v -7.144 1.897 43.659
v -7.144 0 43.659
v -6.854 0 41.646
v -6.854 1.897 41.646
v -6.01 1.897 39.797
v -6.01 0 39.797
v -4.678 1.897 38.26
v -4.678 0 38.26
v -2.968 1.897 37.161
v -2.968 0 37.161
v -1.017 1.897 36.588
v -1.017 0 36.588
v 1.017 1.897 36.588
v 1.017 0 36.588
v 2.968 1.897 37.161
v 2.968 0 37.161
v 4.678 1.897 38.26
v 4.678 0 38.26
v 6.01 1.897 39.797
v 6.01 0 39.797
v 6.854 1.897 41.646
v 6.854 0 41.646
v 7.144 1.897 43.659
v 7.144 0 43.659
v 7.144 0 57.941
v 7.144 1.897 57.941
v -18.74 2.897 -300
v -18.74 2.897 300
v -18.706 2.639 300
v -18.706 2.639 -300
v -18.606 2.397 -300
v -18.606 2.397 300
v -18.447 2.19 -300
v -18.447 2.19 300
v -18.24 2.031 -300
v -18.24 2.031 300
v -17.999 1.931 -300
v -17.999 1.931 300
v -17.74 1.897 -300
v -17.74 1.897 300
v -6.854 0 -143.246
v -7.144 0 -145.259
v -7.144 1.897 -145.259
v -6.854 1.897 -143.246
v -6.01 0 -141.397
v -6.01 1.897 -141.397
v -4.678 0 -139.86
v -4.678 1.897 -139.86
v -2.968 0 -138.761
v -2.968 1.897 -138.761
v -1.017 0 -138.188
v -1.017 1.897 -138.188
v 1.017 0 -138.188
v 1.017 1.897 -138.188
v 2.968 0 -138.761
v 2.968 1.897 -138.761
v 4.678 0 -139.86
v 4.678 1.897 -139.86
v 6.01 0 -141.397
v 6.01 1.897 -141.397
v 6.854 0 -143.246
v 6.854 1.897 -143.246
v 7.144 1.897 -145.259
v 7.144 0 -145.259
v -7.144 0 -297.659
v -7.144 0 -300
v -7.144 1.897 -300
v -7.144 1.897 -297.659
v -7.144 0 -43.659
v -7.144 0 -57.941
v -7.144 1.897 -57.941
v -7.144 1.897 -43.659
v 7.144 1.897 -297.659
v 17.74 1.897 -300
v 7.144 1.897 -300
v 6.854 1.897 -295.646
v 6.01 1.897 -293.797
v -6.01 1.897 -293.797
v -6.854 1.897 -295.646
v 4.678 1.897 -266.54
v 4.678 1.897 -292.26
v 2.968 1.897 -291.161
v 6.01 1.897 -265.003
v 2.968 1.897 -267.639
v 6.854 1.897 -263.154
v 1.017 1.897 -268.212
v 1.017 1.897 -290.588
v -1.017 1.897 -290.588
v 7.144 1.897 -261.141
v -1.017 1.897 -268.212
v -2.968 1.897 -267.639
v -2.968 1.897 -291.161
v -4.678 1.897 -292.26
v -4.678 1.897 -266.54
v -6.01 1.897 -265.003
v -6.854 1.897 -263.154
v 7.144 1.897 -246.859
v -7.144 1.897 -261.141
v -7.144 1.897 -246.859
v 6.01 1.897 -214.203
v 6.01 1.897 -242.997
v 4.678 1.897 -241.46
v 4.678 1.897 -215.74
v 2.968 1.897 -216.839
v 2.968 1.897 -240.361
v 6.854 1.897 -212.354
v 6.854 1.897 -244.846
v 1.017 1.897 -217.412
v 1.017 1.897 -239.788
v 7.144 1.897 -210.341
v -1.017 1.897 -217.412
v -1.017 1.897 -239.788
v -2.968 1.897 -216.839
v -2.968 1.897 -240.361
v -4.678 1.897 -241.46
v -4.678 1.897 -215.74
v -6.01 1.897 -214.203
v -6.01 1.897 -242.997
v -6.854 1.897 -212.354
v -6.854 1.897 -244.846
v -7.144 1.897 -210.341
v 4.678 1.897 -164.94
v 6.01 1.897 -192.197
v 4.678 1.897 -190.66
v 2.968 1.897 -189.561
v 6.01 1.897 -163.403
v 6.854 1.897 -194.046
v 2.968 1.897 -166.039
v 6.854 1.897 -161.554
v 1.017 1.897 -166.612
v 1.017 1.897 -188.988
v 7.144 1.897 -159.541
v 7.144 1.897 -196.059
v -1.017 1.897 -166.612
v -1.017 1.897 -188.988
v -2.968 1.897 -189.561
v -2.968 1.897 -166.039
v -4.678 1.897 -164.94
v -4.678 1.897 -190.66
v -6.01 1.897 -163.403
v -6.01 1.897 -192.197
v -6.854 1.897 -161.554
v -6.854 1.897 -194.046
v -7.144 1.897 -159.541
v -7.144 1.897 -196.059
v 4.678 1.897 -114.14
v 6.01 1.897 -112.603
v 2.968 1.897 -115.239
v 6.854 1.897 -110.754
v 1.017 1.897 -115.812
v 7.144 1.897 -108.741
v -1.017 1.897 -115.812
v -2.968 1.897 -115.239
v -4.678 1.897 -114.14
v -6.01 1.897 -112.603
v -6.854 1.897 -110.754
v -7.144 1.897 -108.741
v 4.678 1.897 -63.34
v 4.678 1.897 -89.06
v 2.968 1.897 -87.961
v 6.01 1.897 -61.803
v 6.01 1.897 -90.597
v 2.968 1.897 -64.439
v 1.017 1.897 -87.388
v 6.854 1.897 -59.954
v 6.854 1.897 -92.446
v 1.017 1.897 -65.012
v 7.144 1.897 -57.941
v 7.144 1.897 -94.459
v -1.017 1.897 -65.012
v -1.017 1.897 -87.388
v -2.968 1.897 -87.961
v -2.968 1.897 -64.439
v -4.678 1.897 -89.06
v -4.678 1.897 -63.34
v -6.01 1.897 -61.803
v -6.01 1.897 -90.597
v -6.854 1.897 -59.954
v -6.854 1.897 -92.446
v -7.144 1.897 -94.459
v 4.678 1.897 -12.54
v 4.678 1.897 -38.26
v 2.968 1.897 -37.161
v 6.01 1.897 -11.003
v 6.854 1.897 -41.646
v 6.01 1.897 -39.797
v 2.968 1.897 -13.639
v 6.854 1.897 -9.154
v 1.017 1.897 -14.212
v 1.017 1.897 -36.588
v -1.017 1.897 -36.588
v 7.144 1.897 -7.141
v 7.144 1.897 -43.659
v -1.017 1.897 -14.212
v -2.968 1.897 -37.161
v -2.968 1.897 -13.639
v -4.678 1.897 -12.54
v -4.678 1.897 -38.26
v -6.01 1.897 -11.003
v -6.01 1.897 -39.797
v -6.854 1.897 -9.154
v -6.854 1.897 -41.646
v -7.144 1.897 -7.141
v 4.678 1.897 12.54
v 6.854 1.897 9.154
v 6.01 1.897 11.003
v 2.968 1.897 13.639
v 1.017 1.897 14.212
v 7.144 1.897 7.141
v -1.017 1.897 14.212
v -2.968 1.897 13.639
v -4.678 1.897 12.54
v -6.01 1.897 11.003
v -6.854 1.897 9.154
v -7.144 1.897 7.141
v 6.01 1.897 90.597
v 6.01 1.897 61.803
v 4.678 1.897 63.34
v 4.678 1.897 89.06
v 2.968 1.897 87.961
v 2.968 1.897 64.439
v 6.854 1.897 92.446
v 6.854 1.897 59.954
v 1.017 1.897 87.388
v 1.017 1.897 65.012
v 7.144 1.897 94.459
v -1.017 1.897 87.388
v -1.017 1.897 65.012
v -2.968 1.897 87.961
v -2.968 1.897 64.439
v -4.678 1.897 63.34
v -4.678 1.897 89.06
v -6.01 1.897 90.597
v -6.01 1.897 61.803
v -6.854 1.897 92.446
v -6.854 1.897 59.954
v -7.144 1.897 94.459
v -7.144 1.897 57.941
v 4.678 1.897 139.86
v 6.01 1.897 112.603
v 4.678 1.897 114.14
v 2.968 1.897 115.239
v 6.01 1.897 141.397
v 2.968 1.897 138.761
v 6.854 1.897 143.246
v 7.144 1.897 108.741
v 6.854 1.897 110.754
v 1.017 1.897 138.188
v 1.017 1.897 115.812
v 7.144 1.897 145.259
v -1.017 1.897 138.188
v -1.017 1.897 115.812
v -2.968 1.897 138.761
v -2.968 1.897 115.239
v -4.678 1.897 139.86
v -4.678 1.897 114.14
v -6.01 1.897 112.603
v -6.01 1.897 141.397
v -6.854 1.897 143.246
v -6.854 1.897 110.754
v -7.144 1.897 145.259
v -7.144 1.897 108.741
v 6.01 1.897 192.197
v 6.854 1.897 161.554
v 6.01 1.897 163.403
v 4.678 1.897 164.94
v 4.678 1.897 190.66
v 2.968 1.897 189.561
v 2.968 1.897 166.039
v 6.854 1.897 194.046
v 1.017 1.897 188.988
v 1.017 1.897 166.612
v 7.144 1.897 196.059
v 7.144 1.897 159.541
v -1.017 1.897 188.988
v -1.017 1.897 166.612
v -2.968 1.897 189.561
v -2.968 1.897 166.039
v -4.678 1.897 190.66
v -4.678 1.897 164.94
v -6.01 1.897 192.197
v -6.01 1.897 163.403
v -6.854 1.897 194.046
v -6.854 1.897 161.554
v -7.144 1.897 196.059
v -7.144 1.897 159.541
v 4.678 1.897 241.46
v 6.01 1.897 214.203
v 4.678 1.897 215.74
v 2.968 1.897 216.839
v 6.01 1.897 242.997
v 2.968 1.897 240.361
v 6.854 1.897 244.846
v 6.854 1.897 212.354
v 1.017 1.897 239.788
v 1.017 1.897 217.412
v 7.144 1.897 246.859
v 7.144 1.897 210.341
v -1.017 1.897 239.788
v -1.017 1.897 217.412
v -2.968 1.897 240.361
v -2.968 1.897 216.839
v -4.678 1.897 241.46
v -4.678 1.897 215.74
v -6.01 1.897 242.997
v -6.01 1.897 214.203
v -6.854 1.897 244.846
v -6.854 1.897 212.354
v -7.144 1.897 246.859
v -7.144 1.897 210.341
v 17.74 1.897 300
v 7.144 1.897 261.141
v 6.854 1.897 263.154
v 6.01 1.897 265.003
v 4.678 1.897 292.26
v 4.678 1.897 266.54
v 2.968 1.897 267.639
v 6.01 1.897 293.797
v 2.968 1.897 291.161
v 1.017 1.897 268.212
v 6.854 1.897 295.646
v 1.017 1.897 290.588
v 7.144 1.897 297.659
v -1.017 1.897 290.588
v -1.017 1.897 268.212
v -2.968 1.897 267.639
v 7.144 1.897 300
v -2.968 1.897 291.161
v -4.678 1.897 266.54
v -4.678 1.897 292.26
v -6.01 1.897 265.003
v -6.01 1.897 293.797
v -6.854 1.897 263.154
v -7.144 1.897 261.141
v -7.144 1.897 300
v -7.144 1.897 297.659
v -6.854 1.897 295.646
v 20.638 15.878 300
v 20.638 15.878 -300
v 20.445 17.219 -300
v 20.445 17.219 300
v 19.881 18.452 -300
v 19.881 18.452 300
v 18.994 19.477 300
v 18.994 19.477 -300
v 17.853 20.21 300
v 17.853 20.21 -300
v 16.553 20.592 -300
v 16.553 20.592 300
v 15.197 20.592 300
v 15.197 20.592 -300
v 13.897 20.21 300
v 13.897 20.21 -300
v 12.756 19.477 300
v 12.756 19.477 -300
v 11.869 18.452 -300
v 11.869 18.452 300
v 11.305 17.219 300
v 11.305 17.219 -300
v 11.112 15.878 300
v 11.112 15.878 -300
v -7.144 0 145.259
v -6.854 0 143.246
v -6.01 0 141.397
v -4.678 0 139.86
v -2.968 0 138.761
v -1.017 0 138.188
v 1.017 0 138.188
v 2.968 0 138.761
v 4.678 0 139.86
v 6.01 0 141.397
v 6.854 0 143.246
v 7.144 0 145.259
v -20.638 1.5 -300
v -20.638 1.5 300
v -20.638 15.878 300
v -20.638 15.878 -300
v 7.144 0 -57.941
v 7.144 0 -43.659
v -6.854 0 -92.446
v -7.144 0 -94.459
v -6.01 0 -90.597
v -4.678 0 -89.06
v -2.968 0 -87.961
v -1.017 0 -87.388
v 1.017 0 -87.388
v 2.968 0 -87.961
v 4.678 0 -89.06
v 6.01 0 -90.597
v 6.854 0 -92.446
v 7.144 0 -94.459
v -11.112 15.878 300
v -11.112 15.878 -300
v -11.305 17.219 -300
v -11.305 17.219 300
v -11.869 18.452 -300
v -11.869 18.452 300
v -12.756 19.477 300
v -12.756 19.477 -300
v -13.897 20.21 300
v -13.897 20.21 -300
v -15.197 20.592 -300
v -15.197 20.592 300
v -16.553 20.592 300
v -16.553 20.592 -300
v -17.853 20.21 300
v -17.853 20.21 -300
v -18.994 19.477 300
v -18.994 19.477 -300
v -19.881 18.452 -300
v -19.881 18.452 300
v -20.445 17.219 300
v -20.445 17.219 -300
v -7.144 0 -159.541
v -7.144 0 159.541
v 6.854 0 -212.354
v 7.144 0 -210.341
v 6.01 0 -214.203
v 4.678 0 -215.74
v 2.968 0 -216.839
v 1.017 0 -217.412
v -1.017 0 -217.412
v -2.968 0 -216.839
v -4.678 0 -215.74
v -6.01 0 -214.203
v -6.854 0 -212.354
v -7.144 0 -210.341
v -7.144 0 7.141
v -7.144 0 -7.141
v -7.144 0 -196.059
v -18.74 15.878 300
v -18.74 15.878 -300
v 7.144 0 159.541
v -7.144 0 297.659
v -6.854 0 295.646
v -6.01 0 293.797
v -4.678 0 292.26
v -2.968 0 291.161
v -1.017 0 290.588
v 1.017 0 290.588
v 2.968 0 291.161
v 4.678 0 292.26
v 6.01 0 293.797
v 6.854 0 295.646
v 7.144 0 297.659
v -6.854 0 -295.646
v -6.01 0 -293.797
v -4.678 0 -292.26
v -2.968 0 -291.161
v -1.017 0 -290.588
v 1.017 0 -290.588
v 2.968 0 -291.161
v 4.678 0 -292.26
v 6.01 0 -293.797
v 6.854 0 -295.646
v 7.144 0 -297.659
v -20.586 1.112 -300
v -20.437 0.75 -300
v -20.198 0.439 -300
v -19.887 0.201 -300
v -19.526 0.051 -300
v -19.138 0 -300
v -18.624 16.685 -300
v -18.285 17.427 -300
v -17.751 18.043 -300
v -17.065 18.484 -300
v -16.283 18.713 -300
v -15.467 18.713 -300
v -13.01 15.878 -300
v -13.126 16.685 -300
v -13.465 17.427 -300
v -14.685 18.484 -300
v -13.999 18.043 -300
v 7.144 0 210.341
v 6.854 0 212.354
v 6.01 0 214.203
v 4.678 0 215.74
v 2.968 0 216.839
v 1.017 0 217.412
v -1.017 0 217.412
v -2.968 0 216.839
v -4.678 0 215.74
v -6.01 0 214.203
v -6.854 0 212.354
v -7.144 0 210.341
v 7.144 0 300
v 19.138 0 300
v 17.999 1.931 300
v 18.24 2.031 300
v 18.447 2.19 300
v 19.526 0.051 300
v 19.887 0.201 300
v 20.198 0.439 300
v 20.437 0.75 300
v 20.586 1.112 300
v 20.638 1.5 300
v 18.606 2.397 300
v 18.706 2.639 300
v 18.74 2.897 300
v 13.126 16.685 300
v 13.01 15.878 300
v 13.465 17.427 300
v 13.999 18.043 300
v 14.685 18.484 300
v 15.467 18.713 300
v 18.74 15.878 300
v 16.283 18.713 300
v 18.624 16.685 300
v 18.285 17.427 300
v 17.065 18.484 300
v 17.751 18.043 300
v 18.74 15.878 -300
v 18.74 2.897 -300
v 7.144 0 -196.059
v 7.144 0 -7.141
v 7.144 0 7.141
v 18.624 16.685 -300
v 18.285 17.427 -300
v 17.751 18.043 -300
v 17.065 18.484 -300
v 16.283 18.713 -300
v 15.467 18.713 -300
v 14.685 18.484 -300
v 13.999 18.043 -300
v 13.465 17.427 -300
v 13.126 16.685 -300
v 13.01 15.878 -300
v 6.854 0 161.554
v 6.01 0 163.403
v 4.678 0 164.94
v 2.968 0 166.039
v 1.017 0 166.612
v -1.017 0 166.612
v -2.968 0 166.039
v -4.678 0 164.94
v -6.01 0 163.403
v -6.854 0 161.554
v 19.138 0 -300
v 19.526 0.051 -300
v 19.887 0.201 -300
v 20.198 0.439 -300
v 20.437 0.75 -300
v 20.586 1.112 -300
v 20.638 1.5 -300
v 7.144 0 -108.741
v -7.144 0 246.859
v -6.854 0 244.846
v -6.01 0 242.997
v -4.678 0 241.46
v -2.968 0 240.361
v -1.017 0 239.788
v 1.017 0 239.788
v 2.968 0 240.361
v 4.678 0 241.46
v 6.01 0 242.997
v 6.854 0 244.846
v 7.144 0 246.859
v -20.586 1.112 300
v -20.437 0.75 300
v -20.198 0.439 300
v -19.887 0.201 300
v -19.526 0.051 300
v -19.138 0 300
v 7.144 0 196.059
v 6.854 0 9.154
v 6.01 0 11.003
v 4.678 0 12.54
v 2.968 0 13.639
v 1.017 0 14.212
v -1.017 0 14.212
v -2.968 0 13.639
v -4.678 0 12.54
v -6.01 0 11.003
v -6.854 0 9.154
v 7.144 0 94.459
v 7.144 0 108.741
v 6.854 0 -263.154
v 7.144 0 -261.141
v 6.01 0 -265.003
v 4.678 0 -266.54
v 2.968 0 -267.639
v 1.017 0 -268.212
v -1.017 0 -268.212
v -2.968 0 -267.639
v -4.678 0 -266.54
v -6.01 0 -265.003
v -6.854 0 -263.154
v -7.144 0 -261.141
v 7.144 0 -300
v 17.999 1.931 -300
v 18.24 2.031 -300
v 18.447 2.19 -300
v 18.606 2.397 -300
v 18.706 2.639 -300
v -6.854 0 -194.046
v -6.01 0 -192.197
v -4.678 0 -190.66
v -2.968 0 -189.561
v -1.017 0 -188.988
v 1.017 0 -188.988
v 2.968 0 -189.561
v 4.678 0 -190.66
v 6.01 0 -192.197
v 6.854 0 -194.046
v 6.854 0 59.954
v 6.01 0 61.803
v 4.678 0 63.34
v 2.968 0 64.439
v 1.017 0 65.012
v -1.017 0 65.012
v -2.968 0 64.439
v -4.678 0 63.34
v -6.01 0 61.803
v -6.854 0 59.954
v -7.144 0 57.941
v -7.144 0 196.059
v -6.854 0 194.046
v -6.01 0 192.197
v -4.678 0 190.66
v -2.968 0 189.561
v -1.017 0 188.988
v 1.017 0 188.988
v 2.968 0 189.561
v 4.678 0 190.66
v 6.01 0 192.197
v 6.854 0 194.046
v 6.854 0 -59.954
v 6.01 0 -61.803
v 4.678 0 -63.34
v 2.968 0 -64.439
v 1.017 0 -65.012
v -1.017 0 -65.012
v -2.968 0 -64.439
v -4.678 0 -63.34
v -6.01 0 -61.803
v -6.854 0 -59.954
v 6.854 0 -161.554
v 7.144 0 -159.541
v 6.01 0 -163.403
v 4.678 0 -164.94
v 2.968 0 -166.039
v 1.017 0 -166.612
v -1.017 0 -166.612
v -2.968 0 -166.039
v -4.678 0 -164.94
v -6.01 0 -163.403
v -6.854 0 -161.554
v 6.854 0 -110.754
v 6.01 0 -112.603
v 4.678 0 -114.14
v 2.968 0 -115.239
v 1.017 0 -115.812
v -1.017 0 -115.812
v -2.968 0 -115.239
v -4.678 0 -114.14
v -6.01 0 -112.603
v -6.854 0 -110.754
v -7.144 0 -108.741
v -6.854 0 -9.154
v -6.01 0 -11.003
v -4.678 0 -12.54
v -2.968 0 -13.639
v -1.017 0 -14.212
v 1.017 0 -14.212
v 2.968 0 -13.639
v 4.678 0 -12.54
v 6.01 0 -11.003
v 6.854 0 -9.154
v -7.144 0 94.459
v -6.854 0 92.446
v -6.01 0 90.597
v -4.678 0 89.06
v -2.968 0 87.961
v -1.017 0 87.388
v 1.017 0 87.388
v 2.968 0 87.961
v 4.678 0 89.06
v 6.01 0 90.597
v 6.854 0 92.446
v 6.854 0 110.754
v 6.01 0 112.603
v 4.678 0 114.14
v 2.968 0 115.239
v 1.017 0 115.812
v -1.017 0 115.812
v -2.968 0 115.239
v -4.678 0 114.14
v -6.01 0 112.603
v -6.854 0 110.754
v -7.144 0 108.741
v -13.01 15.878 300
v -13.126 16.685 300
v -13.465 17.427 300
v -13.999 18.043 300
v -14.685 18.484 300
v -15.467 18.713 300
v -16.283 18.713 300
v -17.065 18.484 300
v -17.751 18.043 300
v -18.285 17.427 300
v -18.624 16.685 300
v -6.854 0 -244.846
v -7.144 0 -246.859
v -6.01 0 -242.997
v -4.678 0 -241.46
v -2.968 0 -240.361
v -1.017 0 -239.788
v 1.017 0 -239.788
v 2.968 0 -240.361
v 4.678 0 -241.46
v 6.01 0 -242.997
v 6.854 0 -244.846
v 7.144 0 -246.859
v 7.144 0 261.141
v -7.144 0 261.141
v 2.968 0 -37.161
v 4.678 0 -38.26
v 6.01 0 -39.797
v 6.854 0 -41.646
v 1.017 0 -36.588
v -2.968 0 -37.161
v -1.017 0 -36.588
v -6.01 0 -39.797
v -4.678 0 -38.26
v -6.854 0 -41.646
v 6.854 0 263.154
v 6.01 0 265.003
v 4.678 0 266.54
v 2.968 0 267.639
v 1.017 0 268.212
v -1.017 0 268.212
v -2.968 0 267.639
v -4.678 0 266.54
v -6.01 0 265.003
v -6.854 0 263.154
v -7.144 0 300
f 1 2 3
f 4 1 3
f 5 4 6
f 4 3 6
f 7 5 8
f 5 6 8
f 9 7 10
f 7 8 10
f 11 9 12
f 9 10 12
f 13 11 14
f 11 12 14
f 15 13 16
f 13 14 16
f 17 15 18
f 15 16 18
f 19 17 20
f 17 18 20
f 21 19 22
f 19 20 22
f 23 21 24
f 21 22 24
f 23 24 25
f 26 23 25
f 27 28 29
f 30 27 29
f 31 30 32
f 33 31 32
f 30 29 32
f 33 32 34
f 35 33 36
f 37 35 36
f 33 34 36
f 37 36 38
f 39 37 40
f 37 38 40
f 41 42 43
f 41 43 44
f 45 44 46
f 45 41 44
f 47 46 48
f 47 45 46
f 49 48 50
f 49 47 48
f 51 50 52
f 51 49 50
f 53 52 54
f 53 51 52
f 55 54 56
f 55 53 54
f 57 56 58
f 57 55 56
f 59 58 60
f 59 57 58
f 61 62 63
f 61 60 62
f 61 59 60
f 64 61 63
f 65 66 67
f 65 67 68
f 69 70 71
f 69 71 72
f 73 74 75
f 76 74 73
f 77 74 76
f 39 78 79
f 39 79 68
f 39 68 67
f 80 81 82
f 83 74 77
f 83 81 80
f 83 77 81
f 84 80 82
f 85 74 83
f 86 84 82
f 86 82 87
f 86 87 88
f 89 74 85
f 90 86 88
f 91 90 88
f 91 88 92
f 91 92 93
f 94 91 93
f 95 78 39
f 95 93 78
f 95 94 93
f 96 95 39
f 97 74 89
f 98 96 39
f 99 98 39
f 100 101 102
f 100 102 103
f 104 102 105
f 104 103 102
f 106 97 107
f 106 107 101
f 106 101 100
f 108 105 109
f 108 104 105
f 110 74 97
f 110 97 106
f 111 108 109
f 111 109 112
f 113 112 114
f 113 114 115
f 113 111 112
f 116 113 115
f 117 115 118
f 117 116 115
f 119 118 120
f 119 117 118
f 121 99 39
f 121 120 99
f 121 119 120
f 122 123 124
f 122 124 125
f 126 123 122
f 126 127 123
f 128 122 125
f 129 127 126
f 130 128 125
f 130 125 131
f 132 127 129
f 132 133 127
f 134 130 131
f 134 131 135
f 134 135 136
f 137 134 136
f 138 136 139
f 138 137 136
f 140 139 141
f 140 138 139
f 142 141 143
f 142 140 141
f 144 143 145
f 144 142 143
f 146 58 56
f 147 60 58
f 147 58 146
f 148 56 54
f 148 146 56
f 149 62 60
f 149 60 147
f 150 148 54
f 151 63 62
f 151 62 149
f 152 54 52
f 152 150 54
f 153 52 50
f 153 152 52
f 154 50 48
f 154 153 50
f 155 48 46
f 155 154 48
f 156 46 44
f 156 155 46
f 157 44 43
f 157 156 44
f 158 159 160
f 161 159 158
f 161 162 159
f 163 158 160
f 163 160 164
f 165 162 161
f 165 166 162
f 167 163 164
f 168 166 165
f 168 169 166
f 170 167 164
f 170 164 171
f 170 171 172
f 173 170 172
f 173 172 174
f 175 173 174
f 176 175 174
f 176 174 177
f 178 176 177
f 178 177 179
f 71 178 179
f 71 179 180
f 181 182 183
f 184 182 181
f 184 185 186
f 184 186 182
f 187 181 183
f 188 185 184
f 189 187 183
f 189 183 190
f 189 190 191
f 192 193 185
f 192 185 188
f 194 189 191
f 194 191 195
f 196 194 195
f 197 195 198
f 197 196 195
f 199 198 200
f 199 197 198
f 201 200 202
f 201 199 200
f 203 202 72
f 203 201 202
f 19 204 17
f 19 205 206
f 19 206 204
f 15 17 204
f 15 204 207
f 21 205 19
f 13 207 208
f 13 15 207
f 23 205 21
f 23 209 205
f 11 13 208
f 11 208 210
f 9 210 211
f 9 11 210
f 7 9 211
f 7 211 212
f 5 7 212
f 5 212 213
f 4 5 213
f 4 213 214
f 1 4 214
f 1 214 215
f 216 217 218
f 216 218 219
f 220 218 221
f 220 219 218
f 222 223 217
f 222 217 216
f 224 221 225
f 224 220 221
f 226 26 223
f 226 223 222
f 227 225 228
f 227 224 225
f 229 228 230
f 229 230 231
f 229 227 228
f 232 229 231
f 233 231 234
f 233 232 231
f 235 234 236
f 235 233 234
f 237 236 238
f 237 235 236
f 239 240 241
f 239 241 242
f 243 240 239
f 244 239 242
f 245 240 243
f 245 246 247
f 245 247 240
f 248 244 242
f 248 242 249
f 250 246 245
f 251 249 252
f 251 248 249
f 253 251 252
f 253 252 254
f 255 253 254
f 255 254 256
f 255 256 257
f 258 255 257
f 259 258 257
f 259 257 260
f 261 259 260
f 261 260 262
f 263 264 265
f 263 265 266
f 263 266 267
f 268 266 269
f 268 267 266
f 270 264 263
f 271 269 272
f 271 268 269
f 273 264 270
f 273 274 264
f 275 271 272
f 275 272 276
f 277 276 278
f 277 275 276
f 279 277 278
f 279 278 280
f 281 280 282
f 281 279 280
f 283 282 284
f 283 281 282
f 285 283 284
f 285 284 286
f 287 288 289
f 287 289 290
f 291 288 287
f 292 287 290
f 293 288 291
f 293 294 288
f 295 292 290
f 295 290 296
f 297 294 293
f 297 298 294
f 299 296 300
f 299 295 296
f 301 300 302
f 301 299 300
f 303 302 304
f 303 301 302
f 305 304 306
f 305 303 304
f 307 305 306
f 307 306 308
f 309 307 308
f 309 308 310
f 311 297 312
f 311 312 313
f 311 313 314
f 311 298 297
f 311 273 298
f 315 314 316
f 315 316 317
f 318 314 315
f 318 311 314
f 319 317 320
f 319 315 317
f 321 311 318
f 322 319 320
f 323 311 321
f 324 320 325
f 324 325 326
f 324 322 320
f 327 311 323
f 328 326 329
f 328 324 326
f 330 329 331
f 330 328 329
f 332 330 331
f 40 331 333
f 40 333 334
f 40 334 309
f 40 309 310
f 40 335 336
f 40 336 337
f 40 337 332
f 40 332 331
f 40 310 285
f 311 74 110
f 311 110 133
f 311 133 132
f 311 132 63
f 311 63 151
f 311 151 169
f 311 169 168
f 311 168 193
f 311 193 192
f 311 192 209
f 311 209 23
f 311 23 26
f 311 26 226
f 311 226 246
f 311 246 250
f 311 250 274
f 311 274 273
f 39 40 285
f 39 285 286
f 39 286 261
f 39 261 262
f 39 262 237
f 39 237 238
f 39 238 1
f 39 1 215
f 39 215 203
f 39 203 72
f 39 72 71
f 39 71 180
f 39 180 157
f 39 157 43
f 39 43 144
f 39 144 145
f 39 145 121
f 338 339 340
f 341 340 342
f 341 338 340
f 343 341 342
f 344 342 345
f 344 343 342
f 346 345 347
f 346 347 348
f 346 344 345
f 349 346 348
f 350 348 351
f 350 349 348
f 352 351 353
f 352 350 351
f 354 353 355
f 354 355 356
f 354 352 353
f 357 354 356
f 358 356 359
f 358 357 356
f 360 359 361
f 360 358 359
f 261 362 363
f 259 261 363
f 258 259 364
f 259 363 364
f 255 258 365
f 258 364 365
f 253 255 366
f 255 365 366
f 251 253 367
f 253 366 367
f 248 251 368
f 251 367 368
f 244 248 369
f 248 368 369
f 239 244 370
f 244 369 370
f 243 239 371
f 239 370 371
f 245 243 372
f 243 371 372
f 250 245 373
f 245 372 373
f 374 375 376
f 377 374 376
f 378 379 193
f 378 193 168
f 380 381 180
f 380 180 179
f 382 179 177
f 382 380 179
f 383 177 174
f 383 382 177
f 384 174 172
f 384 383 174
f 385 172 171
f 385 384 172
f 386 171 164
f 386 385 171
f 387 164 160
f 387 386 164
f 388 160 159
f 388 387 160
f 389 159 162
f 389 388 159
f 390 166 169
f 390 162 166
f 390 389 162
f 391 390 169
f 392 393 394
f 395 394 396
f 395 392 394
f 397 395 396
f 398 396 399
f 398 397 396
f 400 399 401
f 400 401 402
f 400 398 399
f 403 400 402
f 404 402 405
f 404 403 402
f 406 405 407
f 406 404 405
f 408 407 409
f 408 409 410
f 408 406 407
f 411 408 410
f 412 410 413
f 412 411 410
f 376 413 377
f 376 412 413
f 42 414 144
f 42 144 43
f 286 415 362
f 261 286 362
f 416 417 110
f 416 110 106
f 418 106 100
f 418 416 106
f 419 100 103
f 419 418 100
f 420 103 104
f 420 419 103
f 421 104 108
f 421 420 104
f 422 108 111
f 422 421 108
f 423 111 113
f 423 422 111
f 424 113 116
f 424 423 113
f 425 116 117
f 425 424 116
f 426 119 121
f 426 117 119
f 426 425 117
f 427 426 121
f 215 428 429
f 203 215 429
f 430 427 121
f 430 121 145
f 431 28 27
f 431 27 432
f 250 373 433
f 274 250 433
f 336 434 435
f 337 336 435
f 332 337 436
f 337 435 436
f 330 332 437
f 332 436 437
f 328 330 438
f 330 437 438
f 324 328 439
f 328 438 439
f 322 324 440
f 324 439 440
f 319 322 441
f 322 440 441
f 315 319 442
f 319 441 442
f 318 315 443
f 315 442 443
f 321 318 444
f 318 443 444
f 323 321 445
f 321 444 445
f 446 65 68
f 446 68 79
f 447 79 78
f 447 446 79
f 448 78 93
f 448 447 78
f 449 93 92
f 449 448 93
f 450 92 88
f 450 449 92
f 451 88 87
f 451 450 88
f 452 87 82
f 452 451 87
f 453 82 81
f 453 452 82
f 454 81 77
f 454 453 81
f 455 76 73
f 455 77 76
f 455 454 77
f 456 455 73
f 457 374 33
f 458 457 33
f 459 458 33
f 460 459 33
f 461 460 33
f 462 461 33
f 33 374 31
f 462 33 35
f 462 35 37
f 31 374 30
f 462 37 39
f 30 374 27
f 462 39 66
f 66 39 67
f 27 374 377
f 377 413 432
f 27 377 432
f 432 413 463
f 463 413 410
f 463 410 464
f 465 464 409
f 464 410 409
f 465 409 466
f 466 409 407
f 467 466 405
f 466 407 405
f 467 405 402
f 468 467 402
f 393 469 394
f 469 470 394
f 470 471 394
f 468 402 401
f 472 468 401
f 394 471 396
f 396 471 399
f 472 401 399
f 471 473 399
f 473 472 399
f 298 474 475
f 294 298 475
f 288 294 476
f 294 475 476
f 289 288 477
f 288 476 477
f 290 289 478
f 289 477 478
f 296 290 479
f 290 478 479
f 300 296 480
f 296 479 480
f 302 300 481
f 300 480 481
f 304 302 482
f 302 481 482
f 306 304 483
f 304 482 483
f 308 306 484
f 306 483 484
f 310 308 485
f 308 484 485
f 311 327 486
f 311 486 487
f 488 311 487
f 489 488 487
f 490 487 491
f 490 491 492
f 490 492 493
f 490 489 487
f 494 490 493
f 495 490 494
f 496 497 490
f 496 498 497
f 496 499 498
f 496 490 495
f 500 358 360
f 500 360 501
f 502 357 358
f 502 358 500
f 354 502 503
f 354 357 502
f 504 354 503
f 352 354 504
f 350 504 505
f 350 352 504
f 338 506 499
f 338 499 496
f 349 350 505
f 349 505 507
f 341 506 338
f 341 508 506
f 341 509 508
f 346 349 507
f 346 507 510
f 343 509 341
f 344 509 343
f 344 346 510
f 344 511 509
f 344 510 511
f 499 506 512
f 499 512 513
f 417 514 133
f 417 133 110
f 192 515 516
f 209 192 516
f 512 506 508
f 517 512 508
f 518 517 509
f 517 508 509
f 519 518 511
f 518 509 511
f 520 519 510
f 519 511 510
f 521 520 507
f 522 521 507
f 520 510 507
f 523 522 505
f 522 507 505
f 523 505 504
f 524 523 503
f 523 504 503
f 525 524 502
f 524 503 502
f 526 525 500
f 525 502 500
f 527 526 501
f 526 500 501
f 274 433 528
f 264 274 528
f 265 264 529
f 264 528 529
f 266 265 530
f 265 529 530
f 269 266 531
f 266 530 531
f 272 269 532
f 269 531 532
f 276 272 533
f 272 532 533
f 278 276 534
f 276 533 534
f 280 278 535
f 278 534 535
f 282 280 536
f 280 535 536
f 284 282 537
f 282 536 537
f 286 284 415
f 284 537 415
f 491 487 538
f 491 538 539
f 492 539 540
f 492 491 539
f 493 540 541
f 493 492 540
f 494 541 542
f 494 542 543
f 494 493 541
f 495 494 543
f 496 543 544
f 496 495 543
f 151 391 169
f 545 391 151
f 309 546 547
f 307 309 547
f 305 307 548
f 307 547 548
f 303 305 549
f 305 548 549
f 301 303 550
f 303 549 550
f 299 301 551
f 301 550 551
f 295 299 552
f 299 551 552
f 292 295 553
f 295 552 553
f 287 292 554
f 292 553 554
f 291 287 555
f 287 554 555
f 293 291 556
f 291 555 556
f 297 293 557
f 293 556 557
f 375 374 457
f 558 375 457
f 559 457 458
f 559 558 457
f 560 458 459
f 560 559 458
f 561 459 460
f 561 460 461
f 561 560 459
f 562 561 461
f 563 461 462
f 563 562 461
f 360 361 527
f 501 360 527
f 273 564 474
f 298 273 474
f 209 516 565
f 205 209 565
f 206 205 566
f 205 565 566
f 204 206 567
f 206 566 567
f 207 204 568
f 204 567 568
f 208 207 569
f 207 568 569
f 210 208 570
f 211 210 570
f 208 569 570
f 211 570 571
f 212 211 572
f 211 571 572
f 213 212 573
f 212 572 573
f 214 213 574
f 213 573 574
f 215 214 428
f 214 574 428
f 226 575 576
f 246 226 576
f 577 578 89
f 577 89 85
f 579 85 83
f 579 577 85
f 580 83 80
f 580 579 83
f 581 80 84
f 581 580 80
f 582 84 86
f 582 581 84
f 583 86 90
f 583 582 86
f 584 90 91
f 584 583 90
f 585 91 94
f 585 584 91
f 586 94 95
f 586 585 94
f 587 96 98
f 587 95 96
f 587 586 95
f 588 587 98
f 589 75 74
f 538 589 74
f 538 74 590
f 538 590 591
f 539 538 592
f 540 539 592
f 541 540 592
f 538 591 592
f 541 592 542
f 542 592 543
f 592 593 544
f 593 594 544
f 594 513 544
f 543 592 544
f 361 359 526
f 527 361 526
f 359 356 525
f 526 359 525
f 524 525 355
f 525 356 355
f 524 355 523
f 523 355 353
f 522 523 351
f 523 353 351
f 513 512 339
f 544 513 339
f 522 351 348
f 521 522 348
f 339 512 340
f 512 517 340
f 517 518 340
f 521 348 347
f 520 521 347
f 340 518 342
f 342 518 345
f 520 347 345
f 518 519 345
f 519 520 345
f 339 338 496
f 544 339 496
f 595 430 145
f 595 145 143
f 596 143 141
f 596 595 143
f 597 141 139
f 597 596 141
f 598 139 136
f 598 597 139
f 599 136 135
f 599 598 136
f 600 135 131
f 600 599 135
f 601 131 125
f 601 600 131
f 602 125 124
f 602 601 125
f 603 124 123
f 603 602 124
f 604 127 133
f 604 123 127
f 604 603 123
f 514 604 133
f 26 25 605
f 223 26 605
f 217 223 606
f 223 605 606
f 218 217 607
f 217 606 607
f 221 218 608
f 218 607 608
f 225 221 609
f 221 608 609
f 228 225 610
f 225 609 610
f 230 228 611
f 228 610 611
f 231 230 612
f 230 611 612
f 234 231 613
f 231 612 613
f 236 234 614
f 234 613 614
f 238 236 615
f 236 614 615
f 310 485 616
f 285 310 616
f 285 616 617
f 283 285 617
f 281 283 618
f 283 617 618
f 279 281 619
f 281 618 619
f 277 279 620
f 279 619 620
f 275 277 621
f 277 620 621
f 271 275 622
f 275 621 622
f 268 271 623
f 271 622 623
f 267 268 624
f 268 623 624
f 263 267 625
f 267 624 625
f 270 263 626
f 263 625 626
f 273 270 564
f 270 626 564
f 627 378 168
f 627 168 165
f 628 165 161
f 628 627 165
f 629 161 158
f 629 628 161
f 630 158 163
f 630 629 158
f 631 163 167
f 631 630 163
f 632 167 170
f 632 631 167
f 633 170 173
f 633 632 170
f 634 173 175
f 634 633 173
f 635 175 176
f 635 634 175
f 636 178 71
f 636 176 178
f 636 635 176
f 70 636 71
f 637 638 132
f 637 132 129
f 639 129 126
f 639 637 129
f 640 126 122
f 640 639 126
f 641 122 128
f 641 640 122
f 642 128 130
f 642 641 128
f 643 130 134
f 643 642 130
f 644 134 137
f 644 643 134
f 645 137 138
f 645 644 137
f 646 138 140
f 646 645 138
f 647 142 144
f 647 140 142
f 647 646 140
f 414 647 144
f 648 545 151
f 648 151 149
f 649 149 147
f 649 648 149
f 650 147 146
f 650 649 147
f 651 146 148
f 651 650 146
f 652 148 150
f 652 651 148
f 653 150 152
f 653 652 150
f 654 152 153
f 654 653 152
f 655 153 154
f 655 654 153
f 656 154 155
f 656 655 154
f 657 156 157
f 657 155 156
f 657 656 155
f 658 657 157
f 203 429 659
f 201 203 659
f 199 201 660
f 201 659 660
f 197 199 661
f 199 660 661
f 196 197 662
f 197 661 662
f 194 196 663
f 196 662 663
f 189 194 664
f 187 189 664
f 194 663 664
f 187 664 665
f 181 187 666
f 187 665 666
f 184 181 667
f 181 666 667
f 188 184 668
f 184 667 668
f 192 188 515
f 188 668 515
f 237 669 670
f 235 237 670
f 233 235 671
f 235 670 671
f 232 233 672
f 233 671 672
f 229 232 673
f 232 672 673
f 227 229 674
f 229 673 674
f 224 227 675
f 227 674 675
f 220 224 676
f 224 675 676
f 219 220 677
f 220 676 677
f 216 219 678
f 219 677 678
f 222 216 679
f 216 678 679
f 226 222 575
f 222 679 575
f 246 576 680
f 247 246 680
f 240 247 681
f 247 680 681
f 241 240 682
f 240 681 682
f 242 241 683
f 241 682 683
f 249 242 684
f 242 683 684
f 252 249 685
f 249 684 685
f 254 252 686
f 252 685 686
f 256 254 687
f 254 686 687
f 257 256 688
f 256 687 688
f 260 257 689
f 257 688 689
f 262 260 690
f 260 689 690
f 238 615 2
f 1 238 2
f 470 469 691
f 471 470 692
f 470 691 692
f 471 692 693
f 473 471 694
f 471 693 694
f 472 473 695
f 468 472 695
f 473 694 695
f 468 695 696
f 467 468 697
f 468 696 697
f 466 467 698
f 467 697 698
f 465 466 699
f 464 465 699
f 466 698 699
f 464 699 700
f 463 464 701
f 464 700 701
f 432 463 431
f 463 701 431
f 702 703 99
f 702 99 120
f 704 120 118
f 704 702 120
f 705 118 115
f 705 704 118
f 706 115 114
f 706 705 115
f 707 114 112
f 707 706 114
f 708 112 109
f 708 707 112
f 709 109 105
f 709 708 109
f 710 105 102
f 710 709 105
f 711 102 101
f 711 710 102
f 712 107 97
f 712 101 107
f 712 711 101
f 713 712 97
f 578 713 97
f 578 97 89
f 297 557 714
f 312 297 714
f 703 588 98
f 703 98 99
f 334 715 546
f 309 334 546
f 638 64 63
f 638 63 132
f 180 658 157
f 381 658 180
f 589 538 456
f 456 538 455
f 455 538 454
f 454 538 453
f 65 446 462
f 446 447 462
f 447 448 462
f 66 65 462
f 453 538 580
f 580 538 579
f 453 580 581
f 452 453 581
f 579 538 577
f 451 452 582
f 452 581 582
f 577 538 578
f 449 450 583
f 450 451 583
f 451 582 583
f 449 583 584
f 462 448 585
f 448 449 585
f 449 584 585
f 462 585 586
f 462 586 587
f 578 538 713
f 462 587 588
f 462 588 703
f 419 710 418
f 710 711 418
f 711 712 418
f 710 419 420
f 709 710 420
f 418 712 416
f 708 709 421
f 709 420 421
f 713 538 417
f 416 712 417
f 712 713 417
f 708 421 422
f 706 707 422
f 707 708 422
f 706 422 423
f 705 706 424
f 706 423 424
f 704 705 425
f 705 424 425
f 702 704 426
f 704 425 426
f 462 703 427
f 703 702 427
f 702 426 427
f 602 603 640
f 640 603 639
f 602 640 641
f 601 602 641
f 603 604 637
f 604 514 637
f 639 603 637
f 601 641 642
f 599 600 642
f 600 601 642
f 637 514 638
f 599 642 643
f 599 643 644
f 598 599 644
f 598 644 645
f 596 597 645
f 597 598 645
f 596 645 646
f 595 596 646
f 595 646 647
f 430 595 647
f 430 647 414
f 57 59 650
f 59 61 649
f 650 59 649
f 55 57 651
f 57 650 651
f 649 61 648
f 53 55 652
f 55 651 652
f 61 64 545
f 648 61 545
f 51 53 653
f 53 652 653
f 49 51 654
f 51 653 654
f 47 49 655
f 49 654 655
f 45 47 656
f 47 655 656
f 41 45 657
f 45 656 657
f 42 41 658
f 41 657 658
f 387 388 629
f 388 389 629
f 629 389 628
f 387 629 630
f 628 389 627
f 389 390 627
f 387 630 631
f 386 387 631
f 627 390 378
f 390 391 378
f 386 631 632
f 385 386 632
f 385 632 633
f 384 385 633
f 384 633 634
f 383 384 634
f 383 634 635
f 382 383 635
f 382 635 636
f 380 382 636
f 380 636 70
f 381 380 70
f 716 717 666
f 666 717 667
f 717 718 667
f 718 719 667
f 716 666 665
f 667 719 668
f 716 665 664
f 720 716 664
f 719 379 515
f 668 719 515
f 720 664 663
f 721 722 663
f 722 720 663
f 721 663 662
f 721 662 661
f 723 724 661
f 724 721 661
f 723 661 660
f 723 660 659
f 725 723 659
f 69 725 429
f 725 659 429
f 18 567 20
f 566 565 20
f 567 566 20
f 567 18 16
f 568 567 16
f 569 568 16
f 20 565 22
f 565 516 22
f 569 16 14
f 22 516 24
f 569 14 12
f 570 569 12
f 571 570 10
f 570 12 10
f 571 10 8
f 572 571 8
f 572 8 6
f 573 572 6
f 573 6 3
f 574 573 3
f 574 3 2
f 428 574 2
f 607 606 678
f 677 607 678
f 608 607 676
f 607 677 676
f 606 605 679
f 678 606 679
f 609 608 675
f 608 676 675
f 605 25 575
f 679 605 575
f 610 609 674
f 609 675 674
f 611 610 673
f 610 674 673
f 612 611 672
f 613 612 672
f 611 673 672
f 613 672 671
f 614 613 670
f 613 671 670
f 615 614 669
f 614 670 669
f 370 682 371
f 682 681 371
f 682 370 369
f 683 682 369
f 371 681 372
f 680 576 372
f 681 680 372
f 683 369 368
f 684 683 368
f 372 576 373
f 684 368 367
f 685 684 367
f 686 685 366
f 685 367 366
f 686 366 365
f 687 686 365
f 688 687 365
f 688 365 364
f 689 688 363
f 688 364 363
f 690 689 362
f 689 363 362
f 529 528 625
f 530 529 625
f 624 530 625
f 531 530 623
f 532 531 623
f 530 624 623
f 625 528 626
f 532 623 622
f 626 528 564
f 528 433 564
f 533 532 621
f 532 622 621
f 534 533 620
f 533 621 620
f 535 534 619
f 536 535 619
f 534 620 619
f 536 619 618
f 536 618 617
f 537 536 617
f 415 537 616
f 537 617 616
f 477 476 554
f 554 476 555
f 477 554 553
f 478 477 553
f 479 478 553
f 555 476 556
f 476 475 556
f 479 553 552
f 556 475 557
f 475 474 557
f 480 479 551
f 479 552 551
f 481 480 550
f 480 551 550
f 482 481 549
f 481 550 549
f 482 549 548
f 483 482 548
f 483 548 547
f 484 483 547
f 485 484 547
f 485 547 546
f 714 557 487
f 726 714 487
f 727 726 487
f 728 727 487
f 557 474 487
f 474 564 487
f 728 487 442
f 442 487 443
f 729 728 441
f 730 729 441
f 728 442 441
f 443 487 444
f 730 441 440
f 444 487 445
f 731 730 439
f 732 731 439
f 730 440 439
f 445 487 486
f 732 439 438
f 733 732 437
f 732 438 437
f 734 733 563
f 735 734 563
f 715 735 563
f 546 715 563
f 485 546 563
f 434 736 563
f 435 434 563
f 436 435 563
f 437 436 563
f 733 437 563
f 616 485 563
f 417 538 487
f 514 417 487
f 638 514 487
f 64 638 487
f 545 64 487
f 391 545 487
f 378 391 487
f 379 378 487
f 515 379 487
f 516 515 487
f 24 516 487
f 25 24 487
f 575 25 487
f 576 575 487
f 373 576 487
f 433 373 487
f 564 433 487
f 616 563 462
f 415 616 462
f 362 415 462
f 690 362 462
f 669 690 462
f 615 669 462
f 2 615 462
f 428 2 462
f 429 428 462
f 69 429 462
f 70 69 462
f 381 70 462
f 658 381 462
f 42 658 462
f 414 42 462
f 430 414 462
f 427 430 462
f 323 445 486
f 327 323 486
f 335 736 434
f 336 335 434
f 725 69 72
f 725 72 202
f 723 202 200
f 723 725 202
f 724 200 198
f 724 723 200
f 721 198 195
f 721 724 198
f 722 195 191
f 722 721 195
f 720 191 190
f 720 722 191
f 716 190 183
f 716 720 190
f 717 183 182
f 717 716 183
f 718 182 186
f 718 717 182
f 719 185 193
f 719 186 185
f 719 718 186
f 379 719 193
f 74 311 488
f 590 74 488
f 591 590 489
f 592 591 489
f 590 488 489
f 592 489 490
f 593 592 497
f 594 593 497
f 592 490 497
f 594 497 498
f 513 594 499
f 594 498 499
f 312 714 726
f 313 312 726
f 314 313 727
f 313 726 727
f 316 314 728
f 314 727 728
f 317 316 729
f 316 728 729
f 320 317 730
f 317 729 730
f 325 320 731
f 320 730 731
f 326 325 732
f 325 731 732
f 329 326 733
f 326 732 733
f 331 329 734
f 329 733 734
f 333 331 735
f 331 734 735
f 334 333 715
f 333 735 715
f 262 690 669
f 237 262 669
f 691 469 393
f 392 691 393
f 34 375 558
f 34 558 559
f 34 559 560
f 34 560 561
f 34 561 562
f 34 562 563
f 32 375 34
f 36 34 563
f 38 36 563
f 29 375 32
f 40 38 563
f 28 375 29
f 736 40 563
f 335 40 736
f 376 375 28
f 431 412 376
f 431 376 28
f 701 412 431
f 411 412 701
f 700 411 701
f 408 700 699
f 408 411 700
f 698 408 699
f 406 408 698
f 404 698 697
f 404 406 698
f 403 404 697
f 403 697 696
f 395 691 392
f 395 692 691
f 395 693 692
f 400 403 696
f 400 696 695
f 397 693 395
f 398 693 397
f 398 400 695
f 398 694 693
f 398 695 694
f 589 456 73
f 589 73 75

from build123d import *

# Parameters (mm, degrees)
PAD_DEPTH                    = 300
POCKET_DEPTH                 = 3
POCKET_LINEARPATTERN_2_DEPTH = 3
POCKET_LINEARPATTERN_3_DEPTH = 3
POCKET_LINEARPATTERN_4_DEPTH = 3
POCKET_LINEARPATTERN_5_DEPTH = 3
POCKET_LINEARPATTERN_6_DEPTH = 3
POCKET_LINEARPATTERN_7_DEPTH = 3
POCKET_LINEARPATTERN_8_DEPTH = 3


with BuildPart() as part:
    # Sketch → Pad (new body, symmetric)
    with BuildSketch(Plane.XY):
        with BuildLine():
            ThreePointArc((-11.1125, 15.8775), (-15.875, 20.64), (-20.6375, 15.8775))
            Line((-20.6375, 1.5), (-20.6375, 15.8775))
            ThreePointArc((-20.6375, 1.5), (-20.19816, 0.43934), (-19.1375, 0))
            Line((19.1375, 0), (-19.1375, 0))
            ThreePointArc((19.1375, 0), (20.19816, 0.43934), (20.6375, 1.5))
            Line((20.6375, 15.8775), (20.6375, 1.5))
            ThreePointArc((20.6375, 15.8775), (15.875, 20.64), (11.1125, 15.8775))
            Line((11.1125, 15.8775), (13.00988, 15.8775))
            ThreePointArc((18.74012, 15.8775), (15.875, 18.74262), (13.00988, 15.8775))
            Line((18.74012, 15.8775), (18.74012, 2.89738))
            ThreePointArc((17.74012, 1.89738), (18.447227, 2.190273), (18.74012, 2.89738))
            Line((17.74012, 1.89738), (-17.74012, 1.89738))
            ThreePointArc((-18.74012, 2.89738), (-18.447227, 2.190273), (-17.74012, 1.89738))
            Line((-18.74012, 2.89738), (-18.74012, 15.8775))
            ThreePointArc((-13.00988, 15.8775), (-15.875, 18.74262), (-18.74012, 15.8775))
            Line((-13.00988, 15.8775), (-11.1125, 15.8775))
        make_face()
    extrude(amount=PAD_DEPTH, both=True)

    # Sketch001 → Pocket (cut)
    with BuildSketch(Plane.XZ):
        with BuildLine():
            ThreePointArc((7.14375, 7.14125), (0, 14.285), (-7.14375, 7.14125))
            Line((-7.14375, 7.14125), (-7.14375, -7.14125))
            ThreePointArc((-7.14375, -7.14125), (0, -14.285), (7.14375, -7.14125))
            Line((7.14375, -7.14125), (7.14375, 7.14125))
        make_face()
    pocket = extrude(amount=-POCKET_DEPTH, mode=Mode.SUBTRACT)

    # Sketch001 LinearPattern 2 → Pocket LinearPattern 2 (cut)
    with BuildSketch(Plane(origin=(0, 0, 50.8), x_dir=(1, 0, 0), z_dir=(0, -1, 0))):
        with BuildLine():
            ThreePointArc((7.14375, 7.14125), (0, 14.285), (-7.14375, 7.14125))
            Line((-7.14375, 7.14125), (-7.14375, -7.14125))
            ThreePointArc((-7.14375, -7.14125), (0, -14.285), (7.14375, -7.14125))
            Line((7.14375, -7.14125), (7.14375, 7.14125))
        make_face()
    pocket_linearpattern_2 = extrude(amount=-POCKET_LINEARPATTERN_2_DEPTH, mode=Mode.SUBTRACT)

    # Sketch001 LinearPattern 3 → Pocket LinearPattern 3 (cut)
    with BuildSketch(Plane(origin=(0, 0, 101.6), x_dir=(1, 0, 0), z_dir=(0, -1, 0))):
        with BuildLine():
            ThreePointArc((7.14375, 7.14125), (0, 14.285), (-7.14375, 7.14125))
            Line((-7.14375, 7.14125), (-7.14375, -7.14125))
            ThreePointArc((-7.14375, -7.14125), (0, -14.285), (7.14375, -7.14125))
            Line((7.14375, -7.14125), (7.14375, 7.14125))
        make_face()
    pocket_linearpattern_3 = extrude(amount=-POCKET_LINEARPATTERN_3_DEPTH, mode=Mode.SUBTRACT)

    # Sketch001 LinearPattern 4 → Pocket LinearPattern 4 (cut)
    with BuildSketch(Plane(origin=(0, 0, 152.4), x_dir=(1, 0, 0), z_dir=(0, -1, 0))):
        with BuildLine():
            ThreePointArc((7.14375, 7.14125), (0, 14.285), (-7.14375, 7.14125))
            Line((-7.14375, 7.14125), (-7.14375, -7.14125))
            ThreePointArc((-7.14375, -7.14125), (0, -14.285), (7.14375, -7.14125))
            Line((7.14375, -7.14125), (7.14375, 7.14125))
        make_face()
    pocket_linearpattern_4 = extrude(amount=-POCKET_LINEARPATTERN_4_DEPTH, mode=Mode.SUBTRACT)

    # Sketch001 LinearPattern 5 → Pocket LinearPattern 5 (cut)
    with BuildSketch(Plane(origin=(0, 0, 203.2), x_dir=(1, 0, 0), z_dir=(0, -1, 0))):
        with BuildLine():
            ThreePointArc((7.14375, 7.14125), (0, 14.285), (-7.14375, 7.14125))
            Line((-7.14375, 7.14125), (-7.14375, -7.14125))
            ThreePointArc((-7.14375, -7.14125), (0, -14.285), (7.14375, -7.14125))
            Line((7.14375, -7.14125), (7.14375, 7.14125))
        make_face()
    pocket_linearpattern_5 = extrude(amount=-POCKET_LINEARPATTERN_5_DEPTH, mode=Mode.SUBTRACT)

    # Sketch001 LinearPattern 6 → Pocket LinearPattern 6 (cut)
    with BuildSketch(Plane(origin=(0, 0, 254), x_dir=(1, 0, 0), z_dir=(0, -1, 0))):
        with BuildLine():
            ThreePointArc((7.14375, 7.14125), (0, 14.285), (-7.14375, 7.14125))
            Line((-7.14375, 7.14125), (-7.14375, -7.14125))
            ThreePointArc((-7.14375, -7.14125), (0, -14.285), (7.14375, -7.14125))
            Line((7.14375, -7.14125), (7.14375, 7.14125))
        make_face()
    pocket_linearpattern_6 = extrude(amount=-POCKET_LINEARPATTERN_6_DEPTH, mode=Mode.SUBTRACT)

    # Sketch001 LinearPattern 7 → Pocket LinearPattern 7 (cut)
    with BuildSketch(Plane(origin=(0, 0, 304.8), x_dir=(1, 0, 0), z_dir=(0, -1, 0))):
        with BuildLine():
            ThreePointArc((7.14375, 7.14125), (0, 14.285), (-7.14375, 7.14125))
            Line((-7.14375, 7.14125), (-7.14375, -7.14125))
            ThreePointArc((-7.14375, -7.14125), (0, -14.285), (7.14375, -7.14125))
            Line((7.14375, -7.14125), (7.14375, 7.14125))
        make_face()
    pocket_linearpattern_7 = extrude(amount=-POCKET_LINEARPATTERN_7_DEPTH, mode=Mode.SUBTRACT)

    # Sketch001 LinearPattern 8 → Pocket LinearPattern 8 (cut)
    with BuildSketch(Plane(origin=(0, 0, 355.6), x_dir=(1, 0, 0), z_dir=(0, -1, 0))):
        with BuildLine():
            ThreePointArc((7.14375, 7.14125), (0, 14.285), (-7.14375, 7.14125))
            Line((-7.14375, 7.14125), (-7.14375, -7.14125))
            ThreePointArc((-7.14375, -7.14125), (0, -14.285), (7.14375, -7.14125))
            Line((7.14375, -7.14125), (7.14375, 7.14125))
        make_face()
    pocket_linearpattern_8 = extrude(amount=-POCKET_LINEARPATTERN_8_DEPTH, mode=Mode.SUBTRACT)

    # Mirrored: Pocket, Pocket LinearPattern 2, Pocket LinearPattern 3, Pocket LinearPattern 4, Pocket LinearPattern 5, Pocket LinearPattern 6, Pocket LinearPattern 7, Pocket LinearPattern 8 across Sketch001 H_Axis
    add(pocket.mirror(Plane(origin=(0, 0, 0), x_dir=(0, -1, 0), z_dir=(0, 0, 1))), mode=Mode.SUBTRACT)
    add(pocket_linearpattern_2.mirror(Plane(origin=(0, 0, 0), x_dir=(0, -1, 0), z_dir=(0, 0, 1))), mode=Mode.SUBTRACT)
    add(pocket_linearpattern_3.mirror(Plane(origin=(0, 0, 0), x_dir=(0, -1, 0), z_dir=(0, 0, 1))), mode=Mode.SUBTRACT)
    add(pocket_linearpattern_4.mirror(Plane(origin=(0, 0, 0), x_dir=(0, -1, 0), z_dir=(0, 0, 1))), mode=Mode.SUBTRACT)
    add(pocket_linearpattern_5.mirror(Plane(origin=(0, 0, 0), x_dir=(0, -1, 0), z_dir=(0, 0, 1))), mode=Mode.SUBTRACT)
    add(pocket_linearpattern_6.mirror(Plane(origin=(0, 0, 0), x_dir=(0, -1, 0), z_dir=(0, 0, 1))), mode=Mode.SUBTRACT)
    add(pocket_linearpattern_7.mirror(Plane(origin=(0, 0, 0), x_dir=(0, -1, 0), z_dir=(0, 0, 1))), mode=Mode.SUBTRACT)
    add(pocket_linearpattern_8.mirror(Plane(origin=(0, 0, 0), x_dir=(0, -1, 0), z_dir=(0, 0, 1))), mode=Mode.SUBTRACT)


solid = part.part
